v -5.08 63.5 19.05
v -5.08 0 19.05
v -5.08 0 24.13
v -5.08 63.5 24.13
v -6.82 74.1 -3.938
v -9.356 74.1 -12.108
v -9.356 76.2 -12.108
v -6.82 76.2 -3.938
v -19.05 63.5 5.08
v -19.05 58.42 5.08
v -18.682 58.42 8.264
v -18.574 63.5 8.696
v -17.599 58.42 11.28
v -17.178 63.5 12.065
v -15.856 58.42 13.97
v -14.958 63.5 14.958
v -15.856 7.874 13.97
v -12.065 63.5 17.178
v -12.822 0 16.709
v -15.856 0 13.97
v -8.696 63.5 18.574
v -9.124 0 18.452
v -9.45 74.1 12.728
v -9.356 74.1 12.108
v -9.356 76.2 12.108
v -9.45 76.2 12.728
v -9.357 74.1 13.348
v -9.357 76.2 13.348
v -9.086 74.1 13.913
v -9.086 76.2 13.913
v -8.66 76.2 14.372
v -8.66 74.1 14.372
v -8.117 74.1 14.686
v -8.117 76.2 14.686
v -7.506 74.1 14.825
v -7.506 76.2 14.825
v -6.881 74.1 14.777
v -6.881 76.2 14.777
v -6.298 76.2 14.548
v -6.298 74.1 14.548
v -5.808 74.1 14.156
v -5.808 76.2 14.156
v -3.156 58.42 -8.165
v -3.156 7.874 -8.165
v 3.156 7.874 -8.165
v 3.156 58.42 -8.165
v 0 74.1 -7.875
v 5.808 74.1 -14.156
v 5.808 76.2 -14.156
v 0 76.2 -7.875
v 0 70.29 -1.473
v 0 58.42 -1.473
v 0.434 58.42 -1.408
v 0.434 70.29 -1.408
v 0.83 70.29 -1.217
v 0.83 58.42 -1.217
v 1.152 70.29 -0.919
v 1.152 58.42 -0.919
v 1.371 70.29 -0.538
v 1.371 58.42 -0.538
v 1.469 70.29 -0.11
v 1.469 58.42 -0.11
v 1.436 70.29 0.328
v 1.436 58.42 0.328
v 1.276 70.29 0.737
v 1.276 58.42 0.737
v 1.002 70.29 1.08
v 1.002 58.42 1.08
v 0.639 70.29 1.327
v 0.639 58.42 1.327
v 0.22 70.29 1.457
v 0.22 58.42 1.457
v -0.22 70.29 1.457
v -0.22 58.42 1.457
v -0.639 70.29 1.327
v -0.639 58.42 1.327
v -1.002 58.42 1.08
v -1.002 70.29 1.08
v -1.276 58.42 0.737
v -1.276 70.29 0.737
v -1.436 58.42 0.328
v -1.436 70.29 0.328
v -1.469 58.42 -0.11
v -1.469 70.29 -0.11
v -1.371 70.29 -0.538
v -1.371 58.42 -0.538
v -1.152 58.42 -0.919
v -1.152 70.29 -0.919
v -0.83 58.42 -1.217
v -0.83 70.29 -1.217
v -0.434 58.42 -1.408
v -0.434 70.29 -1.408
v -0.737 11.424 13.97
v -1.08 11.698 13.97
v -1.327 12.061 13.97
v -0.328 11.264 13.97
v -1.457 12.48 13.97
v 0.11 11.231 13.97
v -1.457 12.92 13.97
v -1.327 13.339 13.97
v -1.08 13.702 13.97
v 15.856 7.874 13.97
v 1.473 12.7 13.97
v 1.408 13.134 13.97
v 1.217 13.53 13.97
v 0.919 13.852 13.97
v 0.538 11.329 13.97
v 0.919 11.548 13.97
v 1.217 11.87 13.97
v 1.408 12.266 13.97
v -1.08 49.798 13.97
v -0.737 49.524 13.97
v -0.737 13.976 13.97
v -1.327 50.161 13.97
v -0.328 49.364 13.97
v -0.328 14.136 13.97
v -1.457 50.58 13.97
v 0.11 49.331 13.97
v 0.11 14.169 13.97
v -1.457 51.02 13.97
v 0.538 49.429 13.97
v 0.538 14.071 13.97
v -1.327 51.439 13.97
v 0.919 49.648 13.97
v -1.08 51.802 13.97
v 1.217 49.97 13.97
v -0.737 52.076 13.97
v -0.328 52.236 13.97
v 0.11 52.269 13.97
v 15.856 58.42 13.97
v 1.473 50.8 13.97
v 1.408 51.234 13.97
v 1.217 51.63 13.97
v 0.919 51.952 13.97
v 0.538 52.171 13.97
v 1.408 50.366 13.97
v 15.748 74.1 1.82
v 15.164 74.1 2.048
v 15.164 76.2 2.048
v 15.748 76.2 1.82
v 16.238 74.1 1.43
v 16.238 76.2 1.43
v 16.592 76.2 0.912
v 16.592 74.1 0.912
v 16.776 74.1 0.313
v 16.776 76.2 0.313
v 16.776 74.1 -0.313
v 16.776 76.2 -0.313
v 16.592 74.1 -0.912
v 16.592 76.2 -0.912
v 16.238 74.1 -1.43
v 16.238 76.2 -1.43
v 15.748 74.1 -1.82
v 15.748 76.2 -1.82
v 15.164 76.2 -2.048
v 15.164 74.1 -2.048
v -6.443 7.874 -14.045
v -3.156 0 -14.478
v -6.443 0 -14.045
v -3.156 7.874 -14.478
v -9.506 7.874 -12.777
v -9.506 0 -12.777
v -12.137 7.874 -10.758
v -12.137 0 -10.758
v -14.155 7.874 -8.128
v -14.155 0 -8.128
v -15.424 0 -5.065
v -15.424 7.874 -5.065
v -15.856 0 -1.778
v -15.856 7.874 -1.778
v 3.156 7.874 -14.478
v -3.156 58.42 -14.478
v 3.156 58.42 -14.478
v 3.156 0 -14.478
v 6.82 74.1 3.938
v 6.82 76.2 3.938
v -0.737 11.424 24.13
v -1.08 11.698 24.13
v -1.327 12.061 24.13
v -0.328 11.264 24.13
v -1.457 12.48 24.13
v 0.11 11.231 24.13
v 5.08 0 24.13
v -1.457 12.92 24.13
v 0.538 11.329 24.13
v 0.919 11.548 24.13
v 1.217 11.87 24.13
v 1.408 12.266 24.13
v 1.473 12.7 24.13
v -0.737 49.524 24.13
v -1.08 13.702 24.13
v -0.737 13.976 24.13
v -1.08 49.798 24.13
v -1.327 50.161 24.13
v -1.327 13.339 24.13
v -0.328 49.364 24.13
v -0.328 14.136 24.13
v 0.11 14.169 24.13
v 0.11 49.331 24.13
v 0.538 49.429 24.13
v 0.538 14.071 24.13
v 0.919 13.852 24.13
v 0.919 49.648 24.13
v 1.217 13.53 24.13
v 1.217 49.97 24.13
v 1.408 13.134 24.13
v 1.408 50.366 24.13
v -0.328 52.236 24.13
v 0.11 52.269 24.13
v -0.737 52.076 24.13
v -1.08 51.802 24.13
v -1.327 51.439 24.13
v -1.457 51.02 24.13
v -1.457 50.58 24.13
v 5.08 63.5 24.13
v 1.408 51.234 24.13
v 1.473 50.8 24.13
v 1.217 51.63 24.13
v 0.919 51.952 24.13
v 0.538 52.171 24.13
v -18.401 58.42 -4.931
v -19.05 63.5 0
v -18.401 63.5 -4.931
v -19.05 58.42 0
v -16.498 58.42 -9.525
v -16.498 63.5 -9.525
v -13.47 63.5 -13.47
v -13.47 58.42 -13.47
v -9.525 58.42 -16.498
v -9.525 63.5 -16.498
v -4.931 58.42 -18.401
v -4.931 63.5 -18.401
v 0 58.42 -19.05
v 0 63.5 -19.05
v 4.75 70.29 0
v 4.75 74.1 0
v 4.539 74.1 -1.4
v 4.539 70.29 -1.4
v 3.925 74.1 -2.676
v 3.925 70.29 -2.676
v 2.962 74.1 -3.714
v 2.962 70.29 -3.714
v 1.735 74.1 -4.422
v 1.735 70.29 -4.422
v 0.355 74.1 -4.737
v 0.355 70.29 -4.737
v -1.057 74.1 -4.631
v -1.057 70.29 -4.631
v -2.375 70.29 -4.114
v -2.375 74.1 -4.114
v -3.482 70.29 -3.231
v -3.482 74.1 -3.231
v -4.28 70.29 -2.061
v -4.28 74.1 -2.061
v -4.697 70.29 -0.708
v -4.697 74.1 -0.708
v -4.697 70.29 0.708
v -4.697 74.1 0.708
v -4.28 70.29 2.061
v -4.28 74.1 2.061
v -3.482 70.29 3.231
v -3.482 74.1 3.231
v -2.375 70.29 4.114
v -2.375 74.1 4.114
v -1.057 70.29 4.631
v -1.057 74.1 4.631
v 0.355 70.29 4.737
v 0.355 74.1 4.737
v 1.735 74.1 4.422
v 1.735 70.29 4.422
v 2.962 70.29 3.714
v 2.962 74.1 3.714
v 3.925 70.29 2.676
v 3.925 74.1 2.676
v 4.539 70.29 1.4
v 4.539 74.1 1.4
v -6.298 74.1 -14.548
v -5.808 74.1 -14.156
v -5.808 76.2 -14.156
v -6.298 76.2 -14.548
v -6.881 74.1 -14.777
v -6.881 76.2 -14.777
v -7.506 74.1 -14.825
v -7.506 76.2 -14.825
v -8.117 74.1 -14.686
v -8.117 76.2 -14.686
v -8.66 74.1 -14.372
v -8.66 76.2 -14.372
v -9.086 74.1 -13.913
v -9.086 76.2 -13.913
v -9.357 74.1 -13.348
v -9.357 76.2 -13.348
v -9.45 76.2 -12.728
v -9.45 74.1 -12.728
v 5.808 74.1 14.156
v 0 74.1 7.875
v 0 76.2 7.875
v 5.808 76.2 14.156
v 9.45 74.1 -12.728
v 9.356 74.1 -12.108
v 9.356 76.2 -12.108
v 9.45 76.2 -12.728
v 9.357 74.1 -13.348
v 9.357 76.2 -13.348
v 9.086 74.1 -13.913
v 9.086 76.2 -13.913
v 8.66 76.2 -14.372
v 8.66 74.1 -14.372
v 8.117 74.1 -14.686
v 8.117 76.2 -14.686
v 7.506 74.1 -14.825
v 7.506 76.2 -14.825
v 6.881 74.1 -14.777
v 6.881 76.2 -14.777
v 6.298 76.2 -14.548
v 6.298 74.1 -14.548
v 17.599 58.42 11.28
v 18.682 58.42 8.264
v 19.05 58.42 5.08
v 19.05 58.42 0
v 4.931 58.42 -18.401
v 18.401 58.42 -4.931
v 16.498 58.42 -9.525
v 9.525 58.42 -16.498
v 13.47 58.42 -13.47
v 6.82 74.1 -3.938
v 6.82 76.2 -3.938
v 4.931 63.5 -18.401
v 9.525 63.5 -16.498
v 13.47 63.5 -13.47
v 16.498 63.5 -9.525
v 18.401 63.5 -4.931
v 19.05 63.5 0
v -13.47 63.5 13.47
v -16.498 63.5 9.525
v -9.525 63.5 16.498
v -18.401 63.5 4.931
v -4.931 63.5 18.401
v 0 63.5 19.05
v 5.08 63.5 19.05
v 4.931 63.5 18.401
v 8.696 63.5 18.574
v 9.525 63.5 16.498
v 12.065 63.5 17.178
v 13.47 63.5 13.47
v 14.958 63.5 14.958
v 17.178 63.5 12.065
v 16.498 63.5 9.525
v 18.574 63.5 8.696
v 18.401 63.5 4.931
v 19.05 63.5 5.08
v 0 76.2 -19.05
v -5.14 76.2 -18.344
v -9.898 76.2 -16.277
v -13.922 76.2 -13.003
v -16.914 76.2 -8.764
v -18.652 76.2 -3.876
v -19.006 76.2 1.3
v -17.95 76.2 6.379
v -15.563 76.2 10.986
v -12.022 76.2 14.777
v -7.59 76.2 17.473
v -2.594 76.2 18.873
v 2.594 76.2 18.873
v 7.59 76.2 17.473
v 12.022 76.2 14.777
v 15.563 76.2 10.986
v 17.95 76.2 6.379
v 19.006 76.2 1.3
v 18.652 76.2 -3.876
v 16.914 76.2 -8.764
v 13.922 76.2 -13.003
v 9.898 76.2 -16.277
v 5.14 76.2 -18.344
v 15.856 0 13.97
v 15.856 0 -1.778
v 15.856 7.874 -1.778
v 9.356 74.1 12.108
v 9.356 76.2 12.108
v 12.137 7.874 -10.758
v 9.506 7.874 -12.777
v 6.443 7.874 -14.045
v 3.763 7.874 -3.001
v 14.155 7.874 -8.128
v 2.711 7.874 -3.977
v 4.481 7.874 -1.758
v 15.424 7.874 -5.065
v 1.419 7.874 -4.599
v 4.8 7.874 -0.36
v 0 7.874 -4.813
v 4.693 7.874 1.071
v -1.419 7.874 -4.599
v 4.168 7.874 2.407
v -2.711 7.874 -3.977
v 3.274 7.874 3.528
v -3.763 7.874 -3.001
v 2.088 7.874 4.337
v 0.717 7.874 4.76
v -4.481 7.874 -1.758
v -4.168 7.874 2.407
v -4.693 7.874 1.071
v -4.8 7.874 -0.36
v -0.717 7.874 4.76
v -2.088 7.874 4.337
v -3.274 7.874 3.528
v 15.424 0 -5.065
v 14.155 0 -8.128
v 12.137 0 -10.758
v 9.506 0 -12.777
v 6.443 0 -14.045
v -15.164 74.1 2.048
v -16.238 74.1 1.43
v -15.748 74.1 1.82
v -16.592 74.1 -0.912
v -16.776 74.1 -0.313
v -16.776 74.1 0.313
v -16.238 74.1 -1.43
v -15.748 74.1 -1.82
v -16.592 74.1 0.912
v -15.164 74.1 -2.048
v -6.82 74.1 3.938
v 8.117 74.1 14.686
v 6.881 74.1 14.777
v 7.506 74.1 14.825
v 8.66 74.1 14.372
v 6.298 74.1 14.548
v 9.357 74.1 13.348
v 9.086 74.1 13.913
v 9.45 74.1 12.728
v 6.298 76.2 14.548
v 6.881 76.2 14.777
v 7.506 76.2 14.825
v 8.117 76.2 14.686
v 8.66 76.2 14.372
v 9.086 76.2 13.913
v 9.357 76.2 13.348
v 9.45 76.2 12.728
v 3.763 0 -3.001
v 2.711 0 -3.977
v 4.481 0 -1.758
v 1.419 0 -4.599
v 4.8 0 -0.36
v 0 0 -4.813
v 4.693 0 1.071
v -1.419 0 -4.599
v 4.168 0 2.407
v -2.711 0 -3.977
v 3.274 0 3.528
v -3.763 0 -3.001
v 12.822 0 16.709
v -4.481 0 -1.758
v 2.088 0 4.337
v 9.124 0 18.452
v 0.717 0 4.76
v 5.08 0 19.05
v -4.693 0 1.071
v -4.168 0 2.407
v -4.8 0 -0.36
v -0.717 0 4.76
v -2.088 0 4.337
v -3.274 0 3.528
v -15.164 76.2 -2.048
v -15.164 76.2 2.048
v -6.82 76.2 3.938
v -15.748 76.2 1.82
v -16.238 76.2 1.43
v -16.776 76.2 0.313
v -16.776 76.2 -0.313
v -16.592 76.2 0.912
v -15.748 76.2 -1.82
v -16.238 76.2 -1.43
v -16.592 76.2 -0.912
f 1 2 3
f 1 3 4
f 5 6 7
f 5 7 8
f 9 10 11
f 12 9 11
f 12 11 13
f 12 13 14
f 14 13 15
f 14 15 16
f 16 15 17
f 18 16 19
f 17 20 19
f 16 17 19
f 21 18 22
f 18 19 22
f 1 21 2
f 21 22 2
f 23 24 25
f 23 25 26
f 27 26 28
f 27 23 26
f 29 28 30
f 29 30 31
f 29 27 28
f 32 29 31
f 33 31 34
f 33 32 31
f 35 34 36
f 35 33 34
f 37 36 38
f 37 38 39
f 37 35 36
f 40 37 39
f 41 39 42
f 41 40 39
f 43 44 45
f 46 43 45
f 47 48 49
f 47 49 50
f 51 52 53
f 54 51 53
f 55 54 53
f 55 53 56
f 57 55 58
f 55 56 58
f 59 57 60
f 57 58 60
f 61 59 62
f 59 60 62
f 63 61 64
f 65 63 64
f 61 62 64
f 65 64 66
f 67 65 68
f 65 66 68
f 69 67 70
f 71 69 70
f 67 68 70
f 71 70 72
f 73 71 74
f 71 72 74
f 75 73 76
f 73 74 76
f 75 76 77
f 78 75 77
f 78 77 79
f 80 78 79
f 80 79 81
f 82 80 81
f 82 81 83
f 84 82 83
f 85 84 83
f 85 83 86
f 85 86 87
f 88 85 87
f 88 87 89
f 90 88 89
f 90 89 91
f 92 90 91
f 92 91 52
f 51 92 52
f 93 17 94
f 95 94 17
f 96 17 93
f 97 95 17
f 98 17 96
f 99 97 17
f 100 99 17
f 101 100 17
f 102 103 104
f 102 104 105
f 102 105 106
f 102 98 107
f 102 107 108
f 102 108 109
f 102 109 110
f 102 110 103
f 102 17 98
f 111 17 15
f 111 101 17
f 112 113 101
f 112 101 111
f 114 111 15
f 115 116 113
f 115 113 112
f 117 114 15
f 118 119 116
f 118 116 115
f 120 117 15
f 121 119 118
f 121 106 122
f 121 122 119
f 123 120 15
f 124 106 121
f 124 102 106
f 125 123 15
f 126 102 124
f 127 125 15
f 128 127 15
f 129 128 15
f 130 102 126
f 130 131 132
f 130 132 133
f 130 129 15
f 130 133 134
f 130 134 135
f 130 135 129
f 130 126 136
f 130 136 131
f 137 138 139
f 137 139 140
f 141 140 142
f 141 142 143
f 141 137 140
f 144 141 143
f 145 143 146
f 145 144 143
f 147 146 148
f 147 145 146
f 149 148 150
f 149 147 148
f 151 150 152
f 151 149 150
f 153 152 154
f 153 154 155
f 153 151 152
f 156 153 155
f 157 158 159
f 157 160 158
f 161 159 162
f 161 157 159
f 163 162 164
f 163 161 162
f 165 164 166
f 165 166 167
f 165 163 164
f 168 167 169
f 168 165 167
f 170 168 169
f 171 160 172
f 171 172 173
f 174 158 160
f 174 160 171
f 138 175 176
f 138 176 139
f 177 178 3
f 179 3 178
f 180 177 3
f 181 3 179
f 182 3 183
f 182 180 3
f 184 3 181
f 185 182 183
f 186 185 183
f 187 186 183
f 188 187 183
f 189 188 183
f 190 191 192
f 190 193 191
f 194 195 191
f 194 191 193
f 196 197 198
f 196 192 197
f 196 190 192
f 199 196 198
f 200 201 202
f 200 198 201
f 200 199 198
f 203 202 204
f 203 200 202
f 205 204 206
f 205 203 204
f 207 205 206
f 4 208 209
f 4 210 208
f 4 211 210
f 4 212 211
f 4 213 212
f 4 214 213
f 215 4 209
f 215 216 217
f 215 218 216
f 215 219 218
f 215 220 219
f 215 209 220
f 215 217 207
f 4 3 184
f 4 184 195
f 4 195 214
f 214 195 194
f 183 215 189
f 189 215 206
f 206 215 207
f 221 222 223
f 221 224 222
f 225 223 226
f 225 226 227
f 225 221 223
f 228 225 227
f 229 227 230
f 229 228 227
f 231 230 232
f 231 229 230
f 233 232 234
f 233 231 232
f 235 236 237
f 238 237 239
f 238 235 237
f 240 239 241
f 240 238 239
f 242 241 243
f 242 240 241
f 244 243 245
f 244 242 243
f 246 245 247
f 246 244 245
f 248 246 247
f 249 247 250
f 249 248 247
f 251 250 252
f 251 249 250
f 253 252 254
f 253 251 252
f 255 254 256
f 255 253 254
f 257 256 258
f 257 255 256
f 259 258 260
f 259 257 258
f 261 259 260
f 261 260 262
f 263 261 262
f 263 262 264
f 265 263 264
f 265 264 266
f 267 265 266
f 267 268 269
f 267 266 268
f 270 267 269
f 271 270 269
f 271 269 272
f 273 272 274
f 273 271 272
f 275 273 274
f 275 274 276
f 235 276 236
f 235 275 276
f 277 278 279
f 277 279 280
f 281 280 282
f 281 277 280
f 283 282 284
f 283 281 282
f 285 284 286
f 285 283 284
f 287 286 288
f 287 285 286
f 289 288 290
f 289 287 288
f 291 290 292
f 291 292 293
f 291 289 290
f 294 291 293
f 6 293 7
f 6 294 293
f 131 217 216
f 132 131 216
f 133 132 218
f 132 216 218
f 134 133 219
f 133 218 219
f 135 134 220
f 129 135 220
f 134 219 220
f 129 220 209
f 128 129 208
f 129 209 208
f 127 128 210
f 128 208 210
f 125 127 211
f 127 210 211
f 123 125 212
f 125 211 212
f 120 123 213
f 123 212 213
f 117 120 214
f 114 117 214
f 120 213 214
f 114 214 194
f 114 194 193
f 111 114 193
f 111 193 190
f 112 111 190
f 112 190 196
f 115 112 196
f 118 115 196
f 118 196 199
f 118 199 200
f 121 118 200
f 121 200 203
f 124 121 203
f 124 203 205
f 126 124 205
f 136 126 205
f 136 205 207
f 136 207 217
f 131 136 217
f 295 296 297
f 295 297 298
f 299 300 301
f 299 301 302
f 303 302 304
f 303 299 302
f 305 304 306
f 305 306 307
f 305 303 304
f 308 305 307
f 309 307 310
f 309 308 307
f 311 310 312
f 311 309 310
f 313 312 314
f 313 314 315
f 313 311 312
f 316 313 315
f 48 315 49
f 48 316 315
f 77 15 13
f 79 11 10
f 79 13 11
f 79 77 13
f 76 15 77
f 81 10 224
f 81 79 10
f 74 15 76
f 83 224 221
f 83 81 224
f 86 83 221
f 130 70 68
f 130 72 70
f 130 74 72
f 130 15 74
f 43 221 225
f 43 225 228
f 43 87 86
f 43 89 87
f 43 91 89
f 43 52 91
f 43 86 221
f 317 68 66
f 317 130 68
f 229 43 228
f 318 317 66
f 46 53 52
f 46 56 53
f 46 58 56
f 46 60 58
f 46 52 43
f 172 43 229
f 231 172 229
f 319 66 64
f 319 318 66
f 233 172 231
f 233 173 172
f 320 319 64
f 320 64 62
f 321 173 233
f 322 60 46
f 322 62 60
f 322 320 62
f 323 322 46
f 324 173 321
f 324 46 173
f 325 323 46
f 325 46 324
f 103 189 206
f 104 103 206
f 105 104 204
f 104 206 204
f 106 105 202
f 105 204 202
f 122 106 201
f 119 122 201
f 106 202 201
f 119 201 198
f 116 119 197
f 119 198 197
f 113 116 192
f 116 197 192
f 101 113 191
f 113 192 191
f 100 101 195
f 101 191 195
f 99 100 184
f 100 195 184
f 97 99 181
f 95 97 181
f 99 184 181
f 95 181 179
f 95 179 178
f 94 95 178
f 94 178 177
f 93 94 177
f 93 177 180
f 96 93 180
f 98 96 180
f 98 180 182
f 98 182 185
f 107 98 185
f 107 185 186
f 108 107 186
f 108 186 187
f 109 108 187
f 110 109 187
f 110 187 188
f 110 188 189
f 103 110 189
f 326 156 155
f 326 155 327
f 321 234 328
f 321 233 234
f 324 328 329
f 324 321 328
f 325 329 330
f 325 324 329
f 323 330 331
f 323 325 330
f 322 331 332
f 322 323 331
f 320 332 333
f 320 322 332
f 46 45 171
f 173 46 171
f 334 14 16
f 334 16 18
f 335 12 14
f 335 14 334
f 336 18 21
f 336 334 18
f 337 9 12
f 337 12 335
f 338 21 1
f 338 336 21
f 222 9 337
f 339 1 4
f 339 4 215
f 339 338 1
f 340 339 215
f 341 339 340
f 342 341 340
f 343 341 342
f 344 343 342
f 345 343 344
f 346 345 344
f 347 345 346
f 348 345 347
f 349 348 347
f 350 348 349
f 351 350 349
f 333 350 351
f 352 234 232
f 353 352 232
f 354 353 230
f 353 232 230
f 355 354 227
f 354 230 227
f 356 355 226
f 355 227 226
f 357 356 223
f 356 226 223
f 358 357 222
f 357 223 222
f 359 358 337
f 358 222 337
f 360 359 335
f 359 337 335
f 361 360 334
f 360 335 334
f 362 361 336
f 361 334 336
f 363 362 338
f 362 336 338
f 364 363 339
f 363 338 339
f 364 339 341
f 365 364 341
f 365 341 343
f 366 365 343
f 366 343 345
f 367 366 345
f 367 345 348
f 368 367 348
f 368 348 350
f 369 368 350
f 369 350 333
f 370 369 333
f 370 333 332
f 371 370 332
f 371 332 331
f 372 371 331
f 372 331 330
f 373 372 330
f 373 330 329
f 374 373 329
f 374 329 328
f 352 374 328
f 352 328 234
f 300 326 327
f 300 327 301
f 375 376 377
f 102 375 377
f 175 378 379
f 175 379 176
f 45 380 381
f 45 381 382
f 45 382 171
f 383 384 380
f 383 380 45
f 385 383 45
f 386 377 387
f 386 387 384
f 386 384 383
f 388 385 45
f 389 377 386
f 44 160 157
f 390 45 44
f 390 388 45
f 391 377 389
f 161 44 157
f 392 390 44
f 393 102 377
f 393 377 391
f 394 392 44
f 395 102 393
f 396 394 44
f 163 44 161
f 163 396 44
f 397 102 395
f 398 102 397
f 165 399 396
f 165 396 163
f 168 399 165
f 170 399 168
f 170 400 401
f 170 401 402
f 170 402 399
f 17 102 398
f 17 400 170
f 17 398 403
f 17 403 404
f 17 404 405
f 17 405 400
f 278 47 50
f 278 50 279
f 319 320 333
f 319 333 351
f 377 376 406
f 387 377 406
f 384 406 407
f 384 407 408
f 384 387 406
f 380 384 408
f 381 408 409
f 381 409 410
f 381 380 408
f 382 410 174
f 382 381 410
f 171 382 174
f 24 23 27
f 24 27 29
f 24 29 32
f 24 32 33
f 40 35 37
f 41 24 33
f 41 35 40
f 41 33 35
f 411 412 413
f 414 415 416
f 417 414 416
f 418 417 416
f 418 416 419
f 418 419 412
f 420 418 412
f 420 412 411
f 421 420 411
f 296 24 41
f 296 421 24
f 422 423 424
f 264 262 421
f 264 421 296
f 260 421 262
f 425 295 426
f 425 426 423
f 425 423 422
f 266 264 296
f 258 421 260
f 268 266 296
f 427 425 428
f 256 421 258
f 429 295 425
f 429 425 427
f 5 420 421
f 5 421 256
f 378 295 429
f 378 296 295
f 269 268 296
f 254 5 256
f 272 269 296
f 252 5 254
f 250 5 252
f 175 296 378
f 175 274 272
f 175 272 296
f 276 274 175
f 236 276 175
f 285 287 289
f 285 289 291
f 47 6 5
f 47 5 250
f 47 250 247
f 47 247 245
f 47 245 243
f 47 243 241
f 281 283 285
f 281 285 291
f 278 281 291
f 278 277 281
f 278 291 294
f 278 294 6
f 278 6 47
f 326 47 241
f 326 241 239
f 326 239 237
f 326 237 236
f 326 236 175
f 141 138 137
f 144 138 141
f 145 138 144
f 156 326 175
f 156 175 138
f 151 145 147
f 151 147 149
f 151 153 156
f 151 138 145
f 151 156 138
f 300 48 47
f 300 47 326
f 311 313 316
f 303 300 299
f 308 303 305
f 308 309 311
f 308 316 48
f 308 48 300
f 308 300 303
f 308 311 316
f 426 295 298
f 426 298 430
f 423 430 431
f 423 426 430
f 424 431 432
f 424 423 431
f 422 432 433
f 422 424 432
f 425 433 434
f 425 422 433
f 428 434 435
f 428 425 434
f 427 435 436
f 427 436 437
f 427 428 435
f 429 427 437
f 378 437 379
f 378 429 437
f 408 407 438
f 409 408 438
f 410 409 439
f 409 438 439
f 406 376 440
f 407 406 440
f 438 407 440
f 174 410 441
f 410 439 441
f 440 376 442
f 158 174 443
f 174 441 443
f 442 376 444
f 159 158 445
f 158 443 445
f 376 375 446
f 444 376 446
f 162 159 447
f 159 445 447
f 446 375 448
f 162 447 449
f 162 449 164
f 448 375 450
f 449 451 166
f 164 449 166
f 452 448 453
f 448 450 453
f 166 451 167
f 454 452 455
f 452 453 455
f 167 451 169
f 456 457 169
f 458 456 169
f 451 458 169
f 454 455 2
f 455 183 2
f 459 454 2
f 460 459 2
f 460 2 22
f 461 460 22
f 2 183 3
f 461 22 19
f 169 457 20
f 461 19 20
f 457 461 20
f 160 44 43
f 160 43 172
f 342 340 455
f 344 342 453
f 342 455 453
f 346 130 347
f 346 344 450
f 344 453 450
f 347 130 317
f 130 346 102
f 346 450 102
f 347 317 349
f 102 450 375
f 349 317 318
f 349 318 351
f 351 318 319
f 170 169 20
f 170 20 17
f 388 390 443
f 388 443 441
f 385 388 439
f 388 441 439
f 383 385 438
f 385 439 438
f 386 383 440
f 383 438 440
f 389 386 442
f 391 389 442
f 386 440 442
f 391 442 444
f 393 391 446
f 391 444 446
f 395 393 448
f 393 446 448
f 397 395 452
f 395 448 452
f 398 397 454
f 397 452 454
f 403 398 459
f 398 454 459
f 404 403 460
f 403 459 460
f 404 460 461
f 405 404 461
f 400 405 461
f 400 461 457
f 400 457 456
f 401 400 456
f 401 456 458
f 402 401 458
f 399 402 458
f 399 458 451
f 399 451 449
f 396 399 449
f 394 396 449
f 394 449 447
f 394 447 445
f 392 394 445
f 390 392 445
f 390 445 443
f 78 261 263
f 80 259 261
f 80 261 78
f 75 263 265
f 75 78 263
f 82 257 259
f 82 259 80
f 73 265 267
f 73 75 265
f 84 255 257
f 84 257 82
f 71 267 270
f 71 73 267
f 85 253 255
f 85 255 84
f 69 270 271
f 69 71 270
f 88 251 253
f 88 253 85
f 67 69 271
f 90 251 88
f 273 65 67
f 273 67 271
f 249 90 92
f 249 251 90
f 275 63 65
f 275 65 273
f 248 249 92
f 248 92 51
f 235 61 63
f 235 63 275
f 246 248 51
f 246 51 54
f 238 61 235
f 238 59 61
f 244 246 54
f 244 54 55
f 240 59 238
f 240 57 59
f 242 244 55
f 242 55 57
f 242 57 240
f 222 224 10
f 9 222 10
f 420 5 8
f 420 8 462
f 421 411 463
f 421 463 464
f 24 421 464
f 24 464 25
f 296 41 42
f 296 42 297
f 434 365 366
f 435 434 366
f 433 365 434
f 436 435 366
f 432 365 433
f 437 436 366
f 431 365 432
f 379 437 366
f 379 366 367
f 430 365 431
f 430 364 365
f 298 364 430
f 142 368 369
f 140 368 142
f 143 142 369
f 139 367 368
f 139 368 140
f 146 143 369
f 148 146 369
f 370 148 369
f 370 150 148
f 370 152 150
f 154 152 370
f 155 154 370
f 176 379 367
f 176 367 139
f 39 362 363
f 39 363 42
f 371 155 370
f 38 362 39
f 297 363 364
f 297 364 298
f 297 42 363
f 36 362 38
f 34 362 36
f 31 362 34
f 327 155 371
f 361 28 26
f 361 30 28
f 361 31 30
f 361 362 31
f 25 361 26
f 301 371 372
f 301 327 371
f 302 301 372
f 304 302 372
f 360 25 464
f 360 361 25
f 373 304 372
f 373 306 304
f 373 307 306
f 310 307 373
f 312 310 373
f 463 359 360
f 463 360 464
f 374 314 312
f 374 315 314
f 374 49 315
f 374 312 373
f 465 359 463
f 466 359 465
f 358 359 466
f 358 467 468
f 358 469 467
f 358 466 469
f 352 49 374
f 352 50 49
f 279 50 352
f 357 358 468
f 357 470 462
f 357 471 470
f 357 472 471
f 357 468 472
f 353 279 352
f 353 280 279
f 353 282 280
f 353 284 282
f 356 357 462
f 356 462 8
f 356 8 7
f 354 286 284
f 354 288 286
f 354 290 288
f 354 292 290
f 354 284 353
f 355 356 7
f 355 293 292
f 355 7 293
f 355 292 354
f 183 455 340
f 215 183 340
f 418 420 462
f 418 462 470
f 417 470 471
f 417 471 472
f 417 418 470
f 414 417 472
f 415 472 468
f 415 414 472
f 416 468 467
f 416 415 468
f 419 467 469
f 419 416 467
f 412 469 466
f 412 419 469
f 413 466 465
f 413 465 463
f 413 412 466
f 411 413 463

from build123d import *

# Parameters (mm, degrees)
SKETCH1_R               = 19.05
BOSS_EXTRUDE1_DEPTH     = 76.2
CAVITY1_START           = 74.1
CAVITY1_OUTLINE_R       = 1.05
CAVITY1_OUTLINE_R_2     = 4.4625
CAVITY1_DEPTH           = 2.1
CAVITY1_START_2         = 71.1599999
CAVITY1_2_OUTLINE_R     = 4.4625
CAVITY1_2_OUTLINE_R_2   = 3.15
CAVITY1_2_DEPTH         = 4.7775
CAVITY1_3_OUTLINE_R     = 3.15
CAVITY1_3_OUTLINE_R_2   = 1.785
CAVITY1_3_DEPTH         = 1.05
CAVITY1_START_3         = 70.95
CAVITY1_4_DEPTH         = 3.15
CUT_EXTRUDE1_DEPTH      = 5.08
CUT_EXTRUDE1_DEPTH_BACK = 3.81
SKETCH2_R               = 4.75
SKETCH4_W               = 8.715142414
SKETCH4_H               = 2.720359939
CUT_EXTRUDE2_DEPTH      = 2.1
SKETCH5_R               = 19.05
CUT_EXTRUDE3_DEPTH      = 63.5
SKETCH8_W               = 38.1
SKETCH8_H               = 38.1
BOSS_EXTRUDE2_DEPTH     = 63.5
SKETCH9_W               = 33.02
SKETCH9_H               = 58.42
CUT_EXTRUDE4_DEPTH      = 42.672
FILLET1_R               = 19.05
FILLET2_R               = 13.97
SKETCH11_W              = 10.16
SKETCH11_H              = 63.5
BOSS_EXTRUDE3_DEPTH     = 5.08
SKETCH12_R              = 1.4732
CUT_EXTRUDE5_DEPTH      = 10.668
SKETCH13_R              = 1.4732
CUT_EXTRUDE6_DEPTH      = 20.32
SKETCH14_W              = 31.71261469
SKETCH14_H              = 7.874
BOSS_EXTRUDE4_DEPTH     = 28.448
FILLET3_R               = 12.7
SKETCH15_R              = 4.8133
CUT_EXTRUDE7_DEPTH      = 28.448
SKETCH16_W              = 2.261133912
SKETCH16_H              = 1.481432563
SKETCH16_W_2            = 1.871283238
SKETCH16_H_2            = 2.027223507
SKETCH16_W_3            = 2.027223508
SKETCH16_H_3            = 2.222148845
SKETCH16_W_4            = 12.670146923
SKETCH16_H_4            = 11.890445574
SKETCH16_W_5            = 1.793313103
SKETCH16_W_6            = 2.30011898
SKETCH16_H_5            = 1.793313103
SKETCH16_H_6            = 1.520417631
CUT_EXTRUDE8_DEPTH      = 2.1
SKETCH17_W              = 6.31261469
SKETCH17_H              = 6.312614691
BOSS_EXTRUDE5_DEPTH     = 50.546


with BuildPart() as part:
    # Sketch1 → Boss-Extrude1 (new body)
    with BuildSketch(Plane(origin=(0, 0, 0), x_dir=(1, 0, 0), z_dir=(0, 1, 0))):
        with Locations(Location((0, 0, 0), (0, 0, 90))):
            Circle(SKETCH1_R)
    extrude(amount=BOSS_EXTRUDE1_DEPTH)

    # Cavity1: read off the stored shape, not the designer's step
    # Cavity1 outline → Cavity1 (cut)
    with BuildSketch(Plane(origin=(0, 0, 0), x_dir=(1, 0, 0), z_dir=(0, 1, 0)).offset(CAVITY1_START)):
        with BuildLine():
            ThreePointArc((5.80813996, -14.156289963), (8.4, -14.549226784), (9.355636751, -12.108141735))
            Line((9.355636751, -12.108141735), (6.819950055, -3.9375))
            Line((6.819950055, -3.9375), (15.163776711, -2.048148228))
            ThreePointArc((15.163776711, -2.048148228), (16.8, 0), (15.163776711, 2.048148228))
            Line((15.163776711, 2.048148228), (6.819950055, 3.9375))
            Line((6.819950055, 3.9375), (9.355636751, 12.108141735))
            ThreePointArc((9.355636751, 12.108141735), (8.4, 14.549226784), (5.80813996, 14.156289963))
            Line((5.80813996, 14.156289963), (0, 7.875))
            Line((0, 7.875), (-5.80813996, 14.156289963))
            ThreePointArc((-5.80813996, 14.156289963), (-8.4, 14.549226784), (-9.355636751, 12.108141735))
            Line((-9.355636751, 12.108141735), (-6.819950055, 3.9375))
            Line((-6.819950055, 3.9375), (-15.163776711, 2.048148228))
            ThreePointArc((-15.163776711, 2.048148228), (-16.8, 0), (-15.163776711, -2.048148228))
            Line((-15.163776711, -2.048148228), (-6.819950055, -3.9375))
            Line((-6.819950055, -3.9375), (-9.355636751, -12.108141735))
            ThreePointArc((-9.355636751, -12.108141735), (-8.4, -14.549226784), (-5.80813996, -14.156289963))
            Line((-5.80813996, -14.156289963), (0, -7.875))
            Line((0, -7.875), (5.80813996, -14.156289963))
        make_face()
        with Locations((-7.0875, -12.275910099)):
            Circle(CAVITY1_OUTLINE_R, mode=Mode.SUBTRACT)
        with Locations((-5.5125, -9.547930077)):
            Circle(CAVITY1_OUTLINE_R, mode=Mode.SUBTRACT)
        with Locations((-3.9375, -6.819950055)):
            Circle(CAVITY1_OUTLINE_R, mode=Mode.SUBTRACT)
        with Locations((7.0875, -12.275910099)):
            Circle(CAVITY1_OUTLINE_R, mode=Mode.SUBTRACT)
        with Locations((5.5125, -9.547930077)):
            Circle(CAVITY1_OUTLINE_R, mode=Mode.SUBTRACT)
        with Locations((3.9375, -6.819950055)):
            Circle(CAVITY1_OUTLINE_R, mode=Mode.SUBTRACT)
        with Locations((-14.175, 0)):
            Circle(CAVITY1_OUTLINE_R, mode=Mode.SUBTRACT)
        with Locations((-11.025, 0)):
            Circle(CAVITY1_OUTLINE_R, mode=Mode.SUBTRACT)
        with Locations((-7.875, 0)):
            Circle(CAVITY1_OUTLINE_R, mode=Mode.SUBTRACT)
        with Locations((-3.9375, 6.819950055)):
            Circle(CAVITY1_OUTLINE_R, mode=Mode.SUBTRACT)
        with Locations((-5.5125, 9.547930077)):
            Circle(CAVITY1_OUTLINE_R, mode=Mode.SUBTRACT)
        with Locations((-7.0875, 12.275910099)):
            Circle(CAVITY1_OUTLINE_R, mode=Mode.SUBTRACT)
        Circle(CAVITY1_OUTLINE_R_2, mode=Mode.SUBTRACT)
        with Locations((7.875, 0)):
            Circle(CAVITY1_OUTLINE_R, mode=Mode.SUBTRACT)
        with Locations((3.9375, 6.819950055)):
            Circle(CAVITY1_OUTLINE_R, mode=Mode.SUBTRACT)
        with Locations((11.025, 0)):
            Circle(CAVITY1_OUTLINE_R, mode=Mode.SUBTRACT)
        with Locations((14.175, 0)):
            Circle(CAVITY1_OUTLINE_R, mode=Mode.SUBTRACT)
        with Locations((5.5125, 9.547930077)):
            Circle(CAVITY1_OUTLINE_R, mode=Mode.SUBTRACT)
        with Locations((7.0875, 12.275910099)):
            Circle(CAVITY1_OUTLINE_R, mode=Mode.SUBTRACT)
    extrude(amount=CAVITY1_DEPTH, mode=Mode.SUBTRACT)

    # Cavity1 2 outline → Cavity1 2 (cut)
    with BuildSketch(Plane(origin=(0, 0, 0), x_dir=(1, 0, 0), z_dir=(0, 1, 0)).offset(CAVITY1_START_2)):
        Circle(CAVITY1_2_OUTLINE_R)
        Circle(CAVITY1_2_OUTLINE_R_2, mode=Mode.SUBTRACT)
    extrude(amount=CAVITY1_2_DEPTH, mode=Mode.SUBTRACT)

    # Cavity1 3 outline → Cavity1 3 (cut)
    with BuildSketch(Plane(origin=(0, 0, 0), x_dir=(1, 0, 0), z_dir=(0, 1, 0)).offset(CAVITY1_START)):
        Circle(CAVITY1_3_OUTLINE_R)
        Circle(CAVITY1_3_OUTLINE_R_2, mode=Mode.SUBTRACT)
    extrude(amount=CAVITY1_3_DEPTH, mode=Mode.SUBTRACT)

    # Cavity1 4 outline → Cavity1 4 (cut)
    with BuildSketch(Plane(origin=(0, 0, 0), x_dir=(1, 0, 0), z_dir=(0, 1, 0)).offset(CAVITY1_START_3)):
        with BuildLine():
            ThreePointArc((3.135298976, -0.303974232), (3.15, 0), (3.135298976, 0.303974232))
            Line((3.135298976, 0.303974232), (2.73, 0))
            Line((2.73, 0), (3.135298976, -0.303974232))
        make_face()
        with BuildLine():
            Line((2.636977506, 0.706575993), (3.107140574, 0.517858526))
            ThreePointArc((3.107140574, 0.517858526), (3.042666353, 0.815279992), (2.949791933, 1.105091648))
            Line((2.949791933, 1.105091648), (2.636977506, 0.706575993))
        make_face()
        with BuildLine():
            ThreePointArc((2.949791933, -1.105091648), (3.042666353, -0.815279992), (3.107140574, -0.517858526))
            Line((3.107140574, -0.517858526), (2.636977506, -0.706575993))
            Line((2.636977506, -0.706575993), (2.949791933, -1.105091648))
        make_face()
        with BuildLine():
            Line((2.364249352, 1.365), (2.867235677, 1.304400081))
            ThreePointArc((2.867235677, 1.304400081), (2.727980022, 1.575), (2.563261445, 1.830898895))
            Line((2.563261445, 1.830898895), (2.364249352, 1.365))
        make_face()
        with BuildLine():
            ThreePointArc((2.563261445, -1.830898895), (2.727980022, -1.575), (2.867235677, -1.304400081))
            Line((2.867235677, -1.304400081), (2.364249352, -1.365))
            Line((2.364249352, -1.365), (2.563261445, -1.830898895))
        make_face()
        with BuildLine():
            Line((1.930401513, 1.930401513), (2.431933407, 2.002048926))
            ThreePointArc((2.431933407, 2.002048926), (2.227386361, 2.227386361), (2.002048926, 2.431933407))
            Line((2.002048926, 2.431933407), (1.930401513, 1.930401513))
        make_face()
        with BuildLine():
            ThreePointArc((2.002048926, -2.431933407), (2.227386361, -2.227386361), (2.431933407, -2.002048926))
            Line((2.431933407, -2.002048926), (1.930401513, -1.930401513))
            Line((1.930401513, -1.930401513), (2.002048926, -2.431933407))
        make_face()
        with BuildLine():
            Line((1.365, 2.364249352), (1.830898895, 2.563261445))
            ThreePointArc((1.830898895, 2.563261445), (1.575, 2.727980022), (1.304400081, 2.867235677))
            Line((1.304400081, 2.867235677), (1.365, 2.364249352))
        make_face()
        with BuildLine():
            ThreePointArc((1.304400081, -2.867235677), (1.575, -2.727980022), (1.830898895, -2.563261445))
            Line((1.830898895, -2.563261445), (1.365, -2.364249352))
            Line((1.365, -2.364249352), (1.304400081, -2.867235677))
        make_face()
        with BuildLine():
            Line((0.706575993, 2.636977506), (1.105091648, 2.949791933))
            ThreePointArc((1.105091648, 2.949791933), (0.815279992, 3.042666353), (0.517858526, 3.107140574))
            Line((0.517858526, 3.107140574), (0.706575993, 2.636977506))
        make_face()
        with BuildLine():
            ThreePointArc((0.517858526, -3.107140574), (0.815279992, -3.042666353), (1.105091648, -2.949791933))
            Line((1.105091648, -2.949791933), (0.706575993, -2.636977506))
            Line((0.706575993, -2.636977506), (0.517858526, -3.107140574))
        make_face()
        with BuildLine():
            Line((0, 2.73), (0.303974232, 3.135298976))
            ThreePointArc((0.303974232, 3.135298976), (0, 3.15), (-0.303974232, 3.135298976))
            Line((-0.303974232, 3.135298976), (0, 2.73))
        make_face()
        with BuildLine():
            ThreePointArc((-0.303974232, -3.135298976), (0, -3.15), (0.303974232, -3.135298976))
            Line((0.303974232, -3.135298976), (0, -2.73))
            Line((0, -2.73), (-0.303974232, -3.135298976))
        make_face()
        with BuildLine():
            Line((-0.706575993, 2.636977506), (-0.517858526, 3.107140574))
            ThreePointArc((-0.517858526, 3.107140574), (-0.815279992, 3.042666353), (-1.105091648, 2.949791933))
            Line((-1.105091648, 2.949791933), (-0.706575993, 2.636977506))
        make_face()
        with BuildLine():
            ThreePointArc((-1.105091648, -2.949791933), (-0.815279992, -3.042666353), (-0.517858526, -3.107140574))
            Line((-0.517858526, -3.107140574), (-0.706575993, -2.636977506))
            Line((-0.706575993, -2.636977506), (-1.105091648, -2.949791933))
        make_face()
        with BuildLine():
            Line((-1.365, 2.364249352), (-1.304400081, 2.867235677))
            ThreePointArc((-1.304400081, 2.867235677), (-1.575, 2.727980022), (-1.830898895, 2.563261445))
            Line((-1.830898895, 2.563261445), (-1.365, 2.364249352))
        make_face()
        with BuildLine():
            ThreePointArc((-1.830898895, -2.563261445), (-1.575, -2.727980022), (-1.304400081, -2.867235677))
            Line((-1.304400081, -2.867235677), (-1.365, -2.364249352))
            Line((-1.365, -2.364249352), (-1.830898895, -2.563261445))
        make_face()
        with BuildLine():
            Line((-1.930401513, 1.930401513), (-2.002048926, 2.431933407))
            ThreePointArc((-2.002048926, 2.431933407), (-2.227386361, 2.227386361), (-2.431933407, 2.002048926))
            Line((-2.431933407, 2.002048926), (-1.930401513, 1.930401513))
        make_face()
        with BuildLine():
            ThreePointArc((-2.431933407, -2.002048926), (-2.227386361, -2.227386361), (-2.002048926, -2.431933407))
            Line((-2.002048926, -2.431933407), (-1.930401513, -1.930401513))
            Line((-1.930401513, -1.930401513), (-2.431933407, -2.002048926))
        make_face()
        with BuildLine():
            Line((-2.364249352, 1.365), (-2.563261445, 1.830898895))
            ThreePointArc((-2.563261445, 1.830898895), (-2.727980022, 1.575), (-2.867235677, 1.304400081))
            Line((-2.867235677, 1.304400081), (-2.364249352, 1.365))
        make_face()
        with BuildLine():
            ThreePointArc((-2.867235677, -1.304400081), (-2.727980022, -1.575), (-2.563261445, -1.830898895))
            Line((-2.563261445, -1.830898895), (-2.364249352, -1.365))
            Line((-2.364249352, -1.365), (-2.867235677, -1.304400081))
        make_face()
        with BuildLine():
            Line((-2.636977506, 0.706575993), (-2.949791933, 1.105091648))
            ThreePointArc((-2.949791933, 1.105091648), (-3.042666353, 0.815279992), (-3.107140574, 0.517858526))
            Line((-3.107140574, 0.517858526), (-2.636977506, 0.706575993))
        make_face()
        with BuildLine():
            ThreePointArc((-3.107140574, -0.517858526), (-3.042666353, -0.815279992), (-2.949791933, -1.105091648))
            Line((-2.949791933, -1.105091648), (-2.636977506, -0.706575993))
            Line((-2.636977506, -0.706575993), (-3.107140574, -0.517858526))
        make_face()
        with BuildLine():
            Line((-2.73, 0), (-3.135298976, 0.303974232))
            ThreePointArc((-3.135298976, 0.303974232), (-3.15, 0), (-3.135298976, -0.303974232))
            Line((-3.135298976, -0.303974232), (-2.73, 0))
        make_face()
    extrude(amount=CAVITY1_4_DEPTH, mode=Mode.SUBTRACT)

    # Cavity1 5 outline → Cavity1 5 (revolve, cut)
    with BuildSketch(Plane.XY):
        with BuildLine():
            Line((3.15, 75.9375), (4.4625, 75.9374999))
            Line((4.4625, 75.9374999), (4.4625, 76.2))
            Line((4.4625, 76.2), (3.4125, 76.2))
            ThreePointArc((3.4125, 76.2), (3.22688447, 76.12311553), (3.15, 75.9375))
        make_face()
        with BuildLine():
            Line((3.15, 70.95), (4.2525, 70.95))
            ThreePointArc((4.2525, 70.95), (4.400992424, 71.011507576), (4.4625, 71.16))
            Line((4.4625, 71.16), (3.15, 71.1599999))
            Line((3.15, 71.1599999), (3.15, 70.95))
        make_face()
    revolve(axis=Axis((0, 0, 0), (0, 1, 0)), mode=Mode.SUBTRACT)


with BuildPart() as body_2:
    # Cavity1 6 outline → Cavity1 6 (revolve)
    with BuildSketch(Plane.XY):
        with BuildLine():
            ThreePointArc((3.4125, 76.2), (3.59811553, 76.12311553), (3.675, 75.9375))
            Line((3.675, 75.9375), (3.675, 75.15))
            Line((3.675, 75.15), (4.725, 75.15))
            Line((4.725, 75.15), (4.725, 75.9375))
            ThreePointArc((4.725, 75.9375), (4.80188447, 76.12311553), (4.9875, 76.2))
            Line((4.9875, 76.2), (3.4125, 76.2))
        make_face()
    revolve(axis=Axis((0, 0, 0), (0, 1, 0)))


with BuildPart() as cut_extrude1_tool:
    # Sketch2 → Cut-Extrude1 (new, two sides: drawn at the far end of the back side and taken through both)
    with BuildSketch(Plane(origin=(0, 74.1, 0), x_dir=(1, 0, 0), z_dir=(0, 1, 0)).offset(-CUT_EXTRUDE1_DEPTH_BACK)):
        Circle(SKETCH2_R)
    extrude(amount=CUT_EXTRUDE1_DEPTH + CUT_EXTRUDE1_DEPTH_BACK)


with BuildPart() as part_1:
    add(part.part)

    # Cut-Extrude1: cut by cut_extrude1_tool
    add(cut_extrude1_tool.part, mode=Mode.SUBTRACT)

    # Sketch4 → Cut-Extrude2 (cut)
    with BuildSketch(Plane(origin=(0, 76.2, 0), x_dir=(1, 0, 0), z_dir=(0, 1, 0))):
        Polygon((1.823455226, -5.611970264), (6.088368584, -13.454724965), (8.574108094, -12.102972418), (4.427174762, -4.477171338), align=None)
        with Locations((10.445939791, -0.057681561)):
            Rectangle(SKETCH4_W, SKETCH4_H)
        Polygon((-1.774869218, -6.007839079), (-6.011321946, -13.087622733), (-8.632108857, -12.464519484), (-4.772101225, -4.214333468), align=None)
        Polygon((-6.011321946, 1.774023268), (-6.011321946, -1.972920099), (-14.424619624, -1.417861531), (-14.929825471, 1.302498408), (-12.950446355, 1.670094581), align=None)
        Polygon((-1.457669544, 5.89987102), (-5.07831145, 4.636856402), (-8.632108857, 12.299145085), (-6.011321946, 13.514675603), align=None)
        Polygon((4.773202572, 4.636856402), (0.880986898, 6.010579581), (6.537597068, 13.703234469), (8.44707549, 12.299145085), align=None)
    extrude(amount=-CUT_EXTRUDE2_DEPTH, mode=Mode.SUBTRACT)

    # Sketch5 → Cut-Extrude3 (cut)
    with BuildSketch(Plane.XZ):
        with Locations(Location((0, 0, 0), (0, 0, 270))):
            Circle(SKETCH5_R)
    extrude(amount=-CUT_EXTRUDE3_DEPTH, mode=Mode.SUBTRACT)

    # Sketch8 → Boss-Extrude2 (add)
    with BuildSketch(Plane.XZ.offset(-63.5)):
        Rectangle(SKETCH8_W, SKETCH8_H)
    extrude(amount=BOSS_EXTRUDE2_DEPTH)

    # Sketch9 → Cut-Extrude4 (cut)
    with BuildSketch(Plane(origin=(19.05, 0, 0), x_dir=(0, 0, -1), z_dir=(1, 0, 0))):
        with Locations((2.54, 29.21)):
            Rectangle(SKETCH9_W, SKETCH9_H)
    extrude(amount=-CUT_EXTRUDE4_DEPTH, mode=Mode.SUBTRACT)

    # Fillet1
    fillet1_edges = [part_1.edges().sort_by_distance(p)[0] for p in [
        (19.05, 60.96, -19.05),
        (-19.05, 60.96, -19.05),
    ]]
    fillet(fillet1_edges, radius=FILLET1_R - 0.0001)  # a hair under: the kernel refuses the full size

    # Fillet2
    fillet2_edges = [part_1.edges().sort_by_distance(p)[0] for p in [
        (-19.05, 31.75, 19.05),
        (19.05, 31.75, 19.05),
    ]]
    fillet(fillet2_edges, radius=FILLET2_R)

    # Sketch11 → Boss-Extrude3 (add)
    with BuildSketch(Plane.XY.offset(19.05)):
        with Locations((0, 31.75)):
            Rectangle(SKETCH11_W, SKETCH11_H)
    extrude(amount=BOSS_EXTRUDE3_DEPTH)

    # Sketch12 → Cut-Extrude5 (cut)
    with BuildSketch(Plane.XY.offset(24.13)):
        with Locations((0, 50.8)):
            Circle(SKETCH12_R)
        with Locations((0, 12.7)):
            Circle(SKETCH12_R)
    extrude(amount=-CUT_EXTRUDE5_DEPTH, mode=Mode.SUBTRACT)

    # Sketch13 → Cut-Extrude6 (cut)
    with BuildSketch(Plane.XZ.offset(-58.42)):
        with Locations(Location((0, 0, 0), (0, 0, 270))):
            Circle(SKETCH13_R)
    extrude(amount=-CUT_EXTRUDE6_DEPTH, mode=Mode.SUBTRACT)

    # Sketch14 → Boss-Extrude4 (add)
    with BuildSketch(Plane(origin=(0, 0, 13.97), x_dir=(-1, 0, 0), z_dir=(0, 0, -1))):
        with Locations((0, 3.937)):
            Rectangle(SKETCH14_W, SKETCH14_H)
    extrude(amount=BOSS_EXTRUDE4_DEPTH)

    # Fillet3
    fillet3_edges = [part_1.edges().sort_by_distance(p)[0] for p in [
        (15.856307345, 3.937, -14.478),
        (-15.856307345, 3.937, -14.478),
    ]]
    fillet(fillet3_edges, radius=FILLET3_R)

    # Sketch15 → Cut-Extrude7 (cut)
    with BuildSketch(Plane.XZ):
        with Locations(Location((0, 0, 0), (0, 0, 270))):
            Circle(SKETCH15_R)
    extrude(amount=-CUT_EXTRUDE7_DEPTH, mode=Mode.SUBTRACT)


with BuildPart() as body_2_1:
    add(body_2.part)

    # Cut-Extrude1: cut by cut_extrude1_tool
    add(cut_extrude1_tool.part, mode=Mode.SUBTRACT)


with BuildPart() as cut_extrude8_tool:
    # Sketch16 → Cut-Extrude8 (new body)
    with BuildSketch(Plane(origin=(0, 74.1, 0), x_dir=(1, 0, 0), z_dir=(0, 1, 0))):
        with Locations((-7.269758387, 12.831380038)):
            Rectangle(SKETCH16_W, SKETCH16_H)
        with Locations((7.622537381, 12.558484566)):
            Rectangle(SKETCH16_W_2, SKETCH16_H_2)
        with Locations((-14.715906271, -0.131154891)):
            Rectangle(SKETCH16_W_3, SKETCH16_H_3)
        with Locations((-0.077013442, 0.60956139)):
            Rectangle(SKETCH16_W_4, SKETCH16_H_4)
        with Locations((15.029700198, -0.131154891)):
            Rectangle(SKETCH16_W_5, SKETCH16_H_3)
        with Locations((7.40811951, -12.664854078)):
            Rectangle(SKETCH16_W_6, SKETCH16_H_5)
        with Locations((-7.269758387, -12.801301815)):
            Rectangle(SKETCH16_W, SKETCH16_H_6)
    extrude(amount=CUT_EXTRUDE8_DEPTH)


with BuildPart() as part_2:
    add(part_1.part)

    # Cut-Extrude8: cut by cut_extrude8_tool
    add(cut_extrude8_tool.part, mode=Mode.SUBTRACT)

    # Sketch17 → Boss-Extrude5 (add)
    with BuildSketch(Plane(origin=(0, 7.874, 0), x_dir=(1, 0, 0), z_dir=(0, 1, 0))):
        with Locations((0, 11.321692655)):
            Rectangle(SKETCH17_W, SKETCH17_H)
    extrude(amount=BOSS_EXTRUDE5_DEPTH)


with BuildPart() as body_2_2:
    add(body_2_1.part)

    # Cut-Extrude8: cut by cut_extrude8_tool
    add(cut_extrude8_tool.part, mode=Mode.SUBTRACT)


solid = part_2.part
